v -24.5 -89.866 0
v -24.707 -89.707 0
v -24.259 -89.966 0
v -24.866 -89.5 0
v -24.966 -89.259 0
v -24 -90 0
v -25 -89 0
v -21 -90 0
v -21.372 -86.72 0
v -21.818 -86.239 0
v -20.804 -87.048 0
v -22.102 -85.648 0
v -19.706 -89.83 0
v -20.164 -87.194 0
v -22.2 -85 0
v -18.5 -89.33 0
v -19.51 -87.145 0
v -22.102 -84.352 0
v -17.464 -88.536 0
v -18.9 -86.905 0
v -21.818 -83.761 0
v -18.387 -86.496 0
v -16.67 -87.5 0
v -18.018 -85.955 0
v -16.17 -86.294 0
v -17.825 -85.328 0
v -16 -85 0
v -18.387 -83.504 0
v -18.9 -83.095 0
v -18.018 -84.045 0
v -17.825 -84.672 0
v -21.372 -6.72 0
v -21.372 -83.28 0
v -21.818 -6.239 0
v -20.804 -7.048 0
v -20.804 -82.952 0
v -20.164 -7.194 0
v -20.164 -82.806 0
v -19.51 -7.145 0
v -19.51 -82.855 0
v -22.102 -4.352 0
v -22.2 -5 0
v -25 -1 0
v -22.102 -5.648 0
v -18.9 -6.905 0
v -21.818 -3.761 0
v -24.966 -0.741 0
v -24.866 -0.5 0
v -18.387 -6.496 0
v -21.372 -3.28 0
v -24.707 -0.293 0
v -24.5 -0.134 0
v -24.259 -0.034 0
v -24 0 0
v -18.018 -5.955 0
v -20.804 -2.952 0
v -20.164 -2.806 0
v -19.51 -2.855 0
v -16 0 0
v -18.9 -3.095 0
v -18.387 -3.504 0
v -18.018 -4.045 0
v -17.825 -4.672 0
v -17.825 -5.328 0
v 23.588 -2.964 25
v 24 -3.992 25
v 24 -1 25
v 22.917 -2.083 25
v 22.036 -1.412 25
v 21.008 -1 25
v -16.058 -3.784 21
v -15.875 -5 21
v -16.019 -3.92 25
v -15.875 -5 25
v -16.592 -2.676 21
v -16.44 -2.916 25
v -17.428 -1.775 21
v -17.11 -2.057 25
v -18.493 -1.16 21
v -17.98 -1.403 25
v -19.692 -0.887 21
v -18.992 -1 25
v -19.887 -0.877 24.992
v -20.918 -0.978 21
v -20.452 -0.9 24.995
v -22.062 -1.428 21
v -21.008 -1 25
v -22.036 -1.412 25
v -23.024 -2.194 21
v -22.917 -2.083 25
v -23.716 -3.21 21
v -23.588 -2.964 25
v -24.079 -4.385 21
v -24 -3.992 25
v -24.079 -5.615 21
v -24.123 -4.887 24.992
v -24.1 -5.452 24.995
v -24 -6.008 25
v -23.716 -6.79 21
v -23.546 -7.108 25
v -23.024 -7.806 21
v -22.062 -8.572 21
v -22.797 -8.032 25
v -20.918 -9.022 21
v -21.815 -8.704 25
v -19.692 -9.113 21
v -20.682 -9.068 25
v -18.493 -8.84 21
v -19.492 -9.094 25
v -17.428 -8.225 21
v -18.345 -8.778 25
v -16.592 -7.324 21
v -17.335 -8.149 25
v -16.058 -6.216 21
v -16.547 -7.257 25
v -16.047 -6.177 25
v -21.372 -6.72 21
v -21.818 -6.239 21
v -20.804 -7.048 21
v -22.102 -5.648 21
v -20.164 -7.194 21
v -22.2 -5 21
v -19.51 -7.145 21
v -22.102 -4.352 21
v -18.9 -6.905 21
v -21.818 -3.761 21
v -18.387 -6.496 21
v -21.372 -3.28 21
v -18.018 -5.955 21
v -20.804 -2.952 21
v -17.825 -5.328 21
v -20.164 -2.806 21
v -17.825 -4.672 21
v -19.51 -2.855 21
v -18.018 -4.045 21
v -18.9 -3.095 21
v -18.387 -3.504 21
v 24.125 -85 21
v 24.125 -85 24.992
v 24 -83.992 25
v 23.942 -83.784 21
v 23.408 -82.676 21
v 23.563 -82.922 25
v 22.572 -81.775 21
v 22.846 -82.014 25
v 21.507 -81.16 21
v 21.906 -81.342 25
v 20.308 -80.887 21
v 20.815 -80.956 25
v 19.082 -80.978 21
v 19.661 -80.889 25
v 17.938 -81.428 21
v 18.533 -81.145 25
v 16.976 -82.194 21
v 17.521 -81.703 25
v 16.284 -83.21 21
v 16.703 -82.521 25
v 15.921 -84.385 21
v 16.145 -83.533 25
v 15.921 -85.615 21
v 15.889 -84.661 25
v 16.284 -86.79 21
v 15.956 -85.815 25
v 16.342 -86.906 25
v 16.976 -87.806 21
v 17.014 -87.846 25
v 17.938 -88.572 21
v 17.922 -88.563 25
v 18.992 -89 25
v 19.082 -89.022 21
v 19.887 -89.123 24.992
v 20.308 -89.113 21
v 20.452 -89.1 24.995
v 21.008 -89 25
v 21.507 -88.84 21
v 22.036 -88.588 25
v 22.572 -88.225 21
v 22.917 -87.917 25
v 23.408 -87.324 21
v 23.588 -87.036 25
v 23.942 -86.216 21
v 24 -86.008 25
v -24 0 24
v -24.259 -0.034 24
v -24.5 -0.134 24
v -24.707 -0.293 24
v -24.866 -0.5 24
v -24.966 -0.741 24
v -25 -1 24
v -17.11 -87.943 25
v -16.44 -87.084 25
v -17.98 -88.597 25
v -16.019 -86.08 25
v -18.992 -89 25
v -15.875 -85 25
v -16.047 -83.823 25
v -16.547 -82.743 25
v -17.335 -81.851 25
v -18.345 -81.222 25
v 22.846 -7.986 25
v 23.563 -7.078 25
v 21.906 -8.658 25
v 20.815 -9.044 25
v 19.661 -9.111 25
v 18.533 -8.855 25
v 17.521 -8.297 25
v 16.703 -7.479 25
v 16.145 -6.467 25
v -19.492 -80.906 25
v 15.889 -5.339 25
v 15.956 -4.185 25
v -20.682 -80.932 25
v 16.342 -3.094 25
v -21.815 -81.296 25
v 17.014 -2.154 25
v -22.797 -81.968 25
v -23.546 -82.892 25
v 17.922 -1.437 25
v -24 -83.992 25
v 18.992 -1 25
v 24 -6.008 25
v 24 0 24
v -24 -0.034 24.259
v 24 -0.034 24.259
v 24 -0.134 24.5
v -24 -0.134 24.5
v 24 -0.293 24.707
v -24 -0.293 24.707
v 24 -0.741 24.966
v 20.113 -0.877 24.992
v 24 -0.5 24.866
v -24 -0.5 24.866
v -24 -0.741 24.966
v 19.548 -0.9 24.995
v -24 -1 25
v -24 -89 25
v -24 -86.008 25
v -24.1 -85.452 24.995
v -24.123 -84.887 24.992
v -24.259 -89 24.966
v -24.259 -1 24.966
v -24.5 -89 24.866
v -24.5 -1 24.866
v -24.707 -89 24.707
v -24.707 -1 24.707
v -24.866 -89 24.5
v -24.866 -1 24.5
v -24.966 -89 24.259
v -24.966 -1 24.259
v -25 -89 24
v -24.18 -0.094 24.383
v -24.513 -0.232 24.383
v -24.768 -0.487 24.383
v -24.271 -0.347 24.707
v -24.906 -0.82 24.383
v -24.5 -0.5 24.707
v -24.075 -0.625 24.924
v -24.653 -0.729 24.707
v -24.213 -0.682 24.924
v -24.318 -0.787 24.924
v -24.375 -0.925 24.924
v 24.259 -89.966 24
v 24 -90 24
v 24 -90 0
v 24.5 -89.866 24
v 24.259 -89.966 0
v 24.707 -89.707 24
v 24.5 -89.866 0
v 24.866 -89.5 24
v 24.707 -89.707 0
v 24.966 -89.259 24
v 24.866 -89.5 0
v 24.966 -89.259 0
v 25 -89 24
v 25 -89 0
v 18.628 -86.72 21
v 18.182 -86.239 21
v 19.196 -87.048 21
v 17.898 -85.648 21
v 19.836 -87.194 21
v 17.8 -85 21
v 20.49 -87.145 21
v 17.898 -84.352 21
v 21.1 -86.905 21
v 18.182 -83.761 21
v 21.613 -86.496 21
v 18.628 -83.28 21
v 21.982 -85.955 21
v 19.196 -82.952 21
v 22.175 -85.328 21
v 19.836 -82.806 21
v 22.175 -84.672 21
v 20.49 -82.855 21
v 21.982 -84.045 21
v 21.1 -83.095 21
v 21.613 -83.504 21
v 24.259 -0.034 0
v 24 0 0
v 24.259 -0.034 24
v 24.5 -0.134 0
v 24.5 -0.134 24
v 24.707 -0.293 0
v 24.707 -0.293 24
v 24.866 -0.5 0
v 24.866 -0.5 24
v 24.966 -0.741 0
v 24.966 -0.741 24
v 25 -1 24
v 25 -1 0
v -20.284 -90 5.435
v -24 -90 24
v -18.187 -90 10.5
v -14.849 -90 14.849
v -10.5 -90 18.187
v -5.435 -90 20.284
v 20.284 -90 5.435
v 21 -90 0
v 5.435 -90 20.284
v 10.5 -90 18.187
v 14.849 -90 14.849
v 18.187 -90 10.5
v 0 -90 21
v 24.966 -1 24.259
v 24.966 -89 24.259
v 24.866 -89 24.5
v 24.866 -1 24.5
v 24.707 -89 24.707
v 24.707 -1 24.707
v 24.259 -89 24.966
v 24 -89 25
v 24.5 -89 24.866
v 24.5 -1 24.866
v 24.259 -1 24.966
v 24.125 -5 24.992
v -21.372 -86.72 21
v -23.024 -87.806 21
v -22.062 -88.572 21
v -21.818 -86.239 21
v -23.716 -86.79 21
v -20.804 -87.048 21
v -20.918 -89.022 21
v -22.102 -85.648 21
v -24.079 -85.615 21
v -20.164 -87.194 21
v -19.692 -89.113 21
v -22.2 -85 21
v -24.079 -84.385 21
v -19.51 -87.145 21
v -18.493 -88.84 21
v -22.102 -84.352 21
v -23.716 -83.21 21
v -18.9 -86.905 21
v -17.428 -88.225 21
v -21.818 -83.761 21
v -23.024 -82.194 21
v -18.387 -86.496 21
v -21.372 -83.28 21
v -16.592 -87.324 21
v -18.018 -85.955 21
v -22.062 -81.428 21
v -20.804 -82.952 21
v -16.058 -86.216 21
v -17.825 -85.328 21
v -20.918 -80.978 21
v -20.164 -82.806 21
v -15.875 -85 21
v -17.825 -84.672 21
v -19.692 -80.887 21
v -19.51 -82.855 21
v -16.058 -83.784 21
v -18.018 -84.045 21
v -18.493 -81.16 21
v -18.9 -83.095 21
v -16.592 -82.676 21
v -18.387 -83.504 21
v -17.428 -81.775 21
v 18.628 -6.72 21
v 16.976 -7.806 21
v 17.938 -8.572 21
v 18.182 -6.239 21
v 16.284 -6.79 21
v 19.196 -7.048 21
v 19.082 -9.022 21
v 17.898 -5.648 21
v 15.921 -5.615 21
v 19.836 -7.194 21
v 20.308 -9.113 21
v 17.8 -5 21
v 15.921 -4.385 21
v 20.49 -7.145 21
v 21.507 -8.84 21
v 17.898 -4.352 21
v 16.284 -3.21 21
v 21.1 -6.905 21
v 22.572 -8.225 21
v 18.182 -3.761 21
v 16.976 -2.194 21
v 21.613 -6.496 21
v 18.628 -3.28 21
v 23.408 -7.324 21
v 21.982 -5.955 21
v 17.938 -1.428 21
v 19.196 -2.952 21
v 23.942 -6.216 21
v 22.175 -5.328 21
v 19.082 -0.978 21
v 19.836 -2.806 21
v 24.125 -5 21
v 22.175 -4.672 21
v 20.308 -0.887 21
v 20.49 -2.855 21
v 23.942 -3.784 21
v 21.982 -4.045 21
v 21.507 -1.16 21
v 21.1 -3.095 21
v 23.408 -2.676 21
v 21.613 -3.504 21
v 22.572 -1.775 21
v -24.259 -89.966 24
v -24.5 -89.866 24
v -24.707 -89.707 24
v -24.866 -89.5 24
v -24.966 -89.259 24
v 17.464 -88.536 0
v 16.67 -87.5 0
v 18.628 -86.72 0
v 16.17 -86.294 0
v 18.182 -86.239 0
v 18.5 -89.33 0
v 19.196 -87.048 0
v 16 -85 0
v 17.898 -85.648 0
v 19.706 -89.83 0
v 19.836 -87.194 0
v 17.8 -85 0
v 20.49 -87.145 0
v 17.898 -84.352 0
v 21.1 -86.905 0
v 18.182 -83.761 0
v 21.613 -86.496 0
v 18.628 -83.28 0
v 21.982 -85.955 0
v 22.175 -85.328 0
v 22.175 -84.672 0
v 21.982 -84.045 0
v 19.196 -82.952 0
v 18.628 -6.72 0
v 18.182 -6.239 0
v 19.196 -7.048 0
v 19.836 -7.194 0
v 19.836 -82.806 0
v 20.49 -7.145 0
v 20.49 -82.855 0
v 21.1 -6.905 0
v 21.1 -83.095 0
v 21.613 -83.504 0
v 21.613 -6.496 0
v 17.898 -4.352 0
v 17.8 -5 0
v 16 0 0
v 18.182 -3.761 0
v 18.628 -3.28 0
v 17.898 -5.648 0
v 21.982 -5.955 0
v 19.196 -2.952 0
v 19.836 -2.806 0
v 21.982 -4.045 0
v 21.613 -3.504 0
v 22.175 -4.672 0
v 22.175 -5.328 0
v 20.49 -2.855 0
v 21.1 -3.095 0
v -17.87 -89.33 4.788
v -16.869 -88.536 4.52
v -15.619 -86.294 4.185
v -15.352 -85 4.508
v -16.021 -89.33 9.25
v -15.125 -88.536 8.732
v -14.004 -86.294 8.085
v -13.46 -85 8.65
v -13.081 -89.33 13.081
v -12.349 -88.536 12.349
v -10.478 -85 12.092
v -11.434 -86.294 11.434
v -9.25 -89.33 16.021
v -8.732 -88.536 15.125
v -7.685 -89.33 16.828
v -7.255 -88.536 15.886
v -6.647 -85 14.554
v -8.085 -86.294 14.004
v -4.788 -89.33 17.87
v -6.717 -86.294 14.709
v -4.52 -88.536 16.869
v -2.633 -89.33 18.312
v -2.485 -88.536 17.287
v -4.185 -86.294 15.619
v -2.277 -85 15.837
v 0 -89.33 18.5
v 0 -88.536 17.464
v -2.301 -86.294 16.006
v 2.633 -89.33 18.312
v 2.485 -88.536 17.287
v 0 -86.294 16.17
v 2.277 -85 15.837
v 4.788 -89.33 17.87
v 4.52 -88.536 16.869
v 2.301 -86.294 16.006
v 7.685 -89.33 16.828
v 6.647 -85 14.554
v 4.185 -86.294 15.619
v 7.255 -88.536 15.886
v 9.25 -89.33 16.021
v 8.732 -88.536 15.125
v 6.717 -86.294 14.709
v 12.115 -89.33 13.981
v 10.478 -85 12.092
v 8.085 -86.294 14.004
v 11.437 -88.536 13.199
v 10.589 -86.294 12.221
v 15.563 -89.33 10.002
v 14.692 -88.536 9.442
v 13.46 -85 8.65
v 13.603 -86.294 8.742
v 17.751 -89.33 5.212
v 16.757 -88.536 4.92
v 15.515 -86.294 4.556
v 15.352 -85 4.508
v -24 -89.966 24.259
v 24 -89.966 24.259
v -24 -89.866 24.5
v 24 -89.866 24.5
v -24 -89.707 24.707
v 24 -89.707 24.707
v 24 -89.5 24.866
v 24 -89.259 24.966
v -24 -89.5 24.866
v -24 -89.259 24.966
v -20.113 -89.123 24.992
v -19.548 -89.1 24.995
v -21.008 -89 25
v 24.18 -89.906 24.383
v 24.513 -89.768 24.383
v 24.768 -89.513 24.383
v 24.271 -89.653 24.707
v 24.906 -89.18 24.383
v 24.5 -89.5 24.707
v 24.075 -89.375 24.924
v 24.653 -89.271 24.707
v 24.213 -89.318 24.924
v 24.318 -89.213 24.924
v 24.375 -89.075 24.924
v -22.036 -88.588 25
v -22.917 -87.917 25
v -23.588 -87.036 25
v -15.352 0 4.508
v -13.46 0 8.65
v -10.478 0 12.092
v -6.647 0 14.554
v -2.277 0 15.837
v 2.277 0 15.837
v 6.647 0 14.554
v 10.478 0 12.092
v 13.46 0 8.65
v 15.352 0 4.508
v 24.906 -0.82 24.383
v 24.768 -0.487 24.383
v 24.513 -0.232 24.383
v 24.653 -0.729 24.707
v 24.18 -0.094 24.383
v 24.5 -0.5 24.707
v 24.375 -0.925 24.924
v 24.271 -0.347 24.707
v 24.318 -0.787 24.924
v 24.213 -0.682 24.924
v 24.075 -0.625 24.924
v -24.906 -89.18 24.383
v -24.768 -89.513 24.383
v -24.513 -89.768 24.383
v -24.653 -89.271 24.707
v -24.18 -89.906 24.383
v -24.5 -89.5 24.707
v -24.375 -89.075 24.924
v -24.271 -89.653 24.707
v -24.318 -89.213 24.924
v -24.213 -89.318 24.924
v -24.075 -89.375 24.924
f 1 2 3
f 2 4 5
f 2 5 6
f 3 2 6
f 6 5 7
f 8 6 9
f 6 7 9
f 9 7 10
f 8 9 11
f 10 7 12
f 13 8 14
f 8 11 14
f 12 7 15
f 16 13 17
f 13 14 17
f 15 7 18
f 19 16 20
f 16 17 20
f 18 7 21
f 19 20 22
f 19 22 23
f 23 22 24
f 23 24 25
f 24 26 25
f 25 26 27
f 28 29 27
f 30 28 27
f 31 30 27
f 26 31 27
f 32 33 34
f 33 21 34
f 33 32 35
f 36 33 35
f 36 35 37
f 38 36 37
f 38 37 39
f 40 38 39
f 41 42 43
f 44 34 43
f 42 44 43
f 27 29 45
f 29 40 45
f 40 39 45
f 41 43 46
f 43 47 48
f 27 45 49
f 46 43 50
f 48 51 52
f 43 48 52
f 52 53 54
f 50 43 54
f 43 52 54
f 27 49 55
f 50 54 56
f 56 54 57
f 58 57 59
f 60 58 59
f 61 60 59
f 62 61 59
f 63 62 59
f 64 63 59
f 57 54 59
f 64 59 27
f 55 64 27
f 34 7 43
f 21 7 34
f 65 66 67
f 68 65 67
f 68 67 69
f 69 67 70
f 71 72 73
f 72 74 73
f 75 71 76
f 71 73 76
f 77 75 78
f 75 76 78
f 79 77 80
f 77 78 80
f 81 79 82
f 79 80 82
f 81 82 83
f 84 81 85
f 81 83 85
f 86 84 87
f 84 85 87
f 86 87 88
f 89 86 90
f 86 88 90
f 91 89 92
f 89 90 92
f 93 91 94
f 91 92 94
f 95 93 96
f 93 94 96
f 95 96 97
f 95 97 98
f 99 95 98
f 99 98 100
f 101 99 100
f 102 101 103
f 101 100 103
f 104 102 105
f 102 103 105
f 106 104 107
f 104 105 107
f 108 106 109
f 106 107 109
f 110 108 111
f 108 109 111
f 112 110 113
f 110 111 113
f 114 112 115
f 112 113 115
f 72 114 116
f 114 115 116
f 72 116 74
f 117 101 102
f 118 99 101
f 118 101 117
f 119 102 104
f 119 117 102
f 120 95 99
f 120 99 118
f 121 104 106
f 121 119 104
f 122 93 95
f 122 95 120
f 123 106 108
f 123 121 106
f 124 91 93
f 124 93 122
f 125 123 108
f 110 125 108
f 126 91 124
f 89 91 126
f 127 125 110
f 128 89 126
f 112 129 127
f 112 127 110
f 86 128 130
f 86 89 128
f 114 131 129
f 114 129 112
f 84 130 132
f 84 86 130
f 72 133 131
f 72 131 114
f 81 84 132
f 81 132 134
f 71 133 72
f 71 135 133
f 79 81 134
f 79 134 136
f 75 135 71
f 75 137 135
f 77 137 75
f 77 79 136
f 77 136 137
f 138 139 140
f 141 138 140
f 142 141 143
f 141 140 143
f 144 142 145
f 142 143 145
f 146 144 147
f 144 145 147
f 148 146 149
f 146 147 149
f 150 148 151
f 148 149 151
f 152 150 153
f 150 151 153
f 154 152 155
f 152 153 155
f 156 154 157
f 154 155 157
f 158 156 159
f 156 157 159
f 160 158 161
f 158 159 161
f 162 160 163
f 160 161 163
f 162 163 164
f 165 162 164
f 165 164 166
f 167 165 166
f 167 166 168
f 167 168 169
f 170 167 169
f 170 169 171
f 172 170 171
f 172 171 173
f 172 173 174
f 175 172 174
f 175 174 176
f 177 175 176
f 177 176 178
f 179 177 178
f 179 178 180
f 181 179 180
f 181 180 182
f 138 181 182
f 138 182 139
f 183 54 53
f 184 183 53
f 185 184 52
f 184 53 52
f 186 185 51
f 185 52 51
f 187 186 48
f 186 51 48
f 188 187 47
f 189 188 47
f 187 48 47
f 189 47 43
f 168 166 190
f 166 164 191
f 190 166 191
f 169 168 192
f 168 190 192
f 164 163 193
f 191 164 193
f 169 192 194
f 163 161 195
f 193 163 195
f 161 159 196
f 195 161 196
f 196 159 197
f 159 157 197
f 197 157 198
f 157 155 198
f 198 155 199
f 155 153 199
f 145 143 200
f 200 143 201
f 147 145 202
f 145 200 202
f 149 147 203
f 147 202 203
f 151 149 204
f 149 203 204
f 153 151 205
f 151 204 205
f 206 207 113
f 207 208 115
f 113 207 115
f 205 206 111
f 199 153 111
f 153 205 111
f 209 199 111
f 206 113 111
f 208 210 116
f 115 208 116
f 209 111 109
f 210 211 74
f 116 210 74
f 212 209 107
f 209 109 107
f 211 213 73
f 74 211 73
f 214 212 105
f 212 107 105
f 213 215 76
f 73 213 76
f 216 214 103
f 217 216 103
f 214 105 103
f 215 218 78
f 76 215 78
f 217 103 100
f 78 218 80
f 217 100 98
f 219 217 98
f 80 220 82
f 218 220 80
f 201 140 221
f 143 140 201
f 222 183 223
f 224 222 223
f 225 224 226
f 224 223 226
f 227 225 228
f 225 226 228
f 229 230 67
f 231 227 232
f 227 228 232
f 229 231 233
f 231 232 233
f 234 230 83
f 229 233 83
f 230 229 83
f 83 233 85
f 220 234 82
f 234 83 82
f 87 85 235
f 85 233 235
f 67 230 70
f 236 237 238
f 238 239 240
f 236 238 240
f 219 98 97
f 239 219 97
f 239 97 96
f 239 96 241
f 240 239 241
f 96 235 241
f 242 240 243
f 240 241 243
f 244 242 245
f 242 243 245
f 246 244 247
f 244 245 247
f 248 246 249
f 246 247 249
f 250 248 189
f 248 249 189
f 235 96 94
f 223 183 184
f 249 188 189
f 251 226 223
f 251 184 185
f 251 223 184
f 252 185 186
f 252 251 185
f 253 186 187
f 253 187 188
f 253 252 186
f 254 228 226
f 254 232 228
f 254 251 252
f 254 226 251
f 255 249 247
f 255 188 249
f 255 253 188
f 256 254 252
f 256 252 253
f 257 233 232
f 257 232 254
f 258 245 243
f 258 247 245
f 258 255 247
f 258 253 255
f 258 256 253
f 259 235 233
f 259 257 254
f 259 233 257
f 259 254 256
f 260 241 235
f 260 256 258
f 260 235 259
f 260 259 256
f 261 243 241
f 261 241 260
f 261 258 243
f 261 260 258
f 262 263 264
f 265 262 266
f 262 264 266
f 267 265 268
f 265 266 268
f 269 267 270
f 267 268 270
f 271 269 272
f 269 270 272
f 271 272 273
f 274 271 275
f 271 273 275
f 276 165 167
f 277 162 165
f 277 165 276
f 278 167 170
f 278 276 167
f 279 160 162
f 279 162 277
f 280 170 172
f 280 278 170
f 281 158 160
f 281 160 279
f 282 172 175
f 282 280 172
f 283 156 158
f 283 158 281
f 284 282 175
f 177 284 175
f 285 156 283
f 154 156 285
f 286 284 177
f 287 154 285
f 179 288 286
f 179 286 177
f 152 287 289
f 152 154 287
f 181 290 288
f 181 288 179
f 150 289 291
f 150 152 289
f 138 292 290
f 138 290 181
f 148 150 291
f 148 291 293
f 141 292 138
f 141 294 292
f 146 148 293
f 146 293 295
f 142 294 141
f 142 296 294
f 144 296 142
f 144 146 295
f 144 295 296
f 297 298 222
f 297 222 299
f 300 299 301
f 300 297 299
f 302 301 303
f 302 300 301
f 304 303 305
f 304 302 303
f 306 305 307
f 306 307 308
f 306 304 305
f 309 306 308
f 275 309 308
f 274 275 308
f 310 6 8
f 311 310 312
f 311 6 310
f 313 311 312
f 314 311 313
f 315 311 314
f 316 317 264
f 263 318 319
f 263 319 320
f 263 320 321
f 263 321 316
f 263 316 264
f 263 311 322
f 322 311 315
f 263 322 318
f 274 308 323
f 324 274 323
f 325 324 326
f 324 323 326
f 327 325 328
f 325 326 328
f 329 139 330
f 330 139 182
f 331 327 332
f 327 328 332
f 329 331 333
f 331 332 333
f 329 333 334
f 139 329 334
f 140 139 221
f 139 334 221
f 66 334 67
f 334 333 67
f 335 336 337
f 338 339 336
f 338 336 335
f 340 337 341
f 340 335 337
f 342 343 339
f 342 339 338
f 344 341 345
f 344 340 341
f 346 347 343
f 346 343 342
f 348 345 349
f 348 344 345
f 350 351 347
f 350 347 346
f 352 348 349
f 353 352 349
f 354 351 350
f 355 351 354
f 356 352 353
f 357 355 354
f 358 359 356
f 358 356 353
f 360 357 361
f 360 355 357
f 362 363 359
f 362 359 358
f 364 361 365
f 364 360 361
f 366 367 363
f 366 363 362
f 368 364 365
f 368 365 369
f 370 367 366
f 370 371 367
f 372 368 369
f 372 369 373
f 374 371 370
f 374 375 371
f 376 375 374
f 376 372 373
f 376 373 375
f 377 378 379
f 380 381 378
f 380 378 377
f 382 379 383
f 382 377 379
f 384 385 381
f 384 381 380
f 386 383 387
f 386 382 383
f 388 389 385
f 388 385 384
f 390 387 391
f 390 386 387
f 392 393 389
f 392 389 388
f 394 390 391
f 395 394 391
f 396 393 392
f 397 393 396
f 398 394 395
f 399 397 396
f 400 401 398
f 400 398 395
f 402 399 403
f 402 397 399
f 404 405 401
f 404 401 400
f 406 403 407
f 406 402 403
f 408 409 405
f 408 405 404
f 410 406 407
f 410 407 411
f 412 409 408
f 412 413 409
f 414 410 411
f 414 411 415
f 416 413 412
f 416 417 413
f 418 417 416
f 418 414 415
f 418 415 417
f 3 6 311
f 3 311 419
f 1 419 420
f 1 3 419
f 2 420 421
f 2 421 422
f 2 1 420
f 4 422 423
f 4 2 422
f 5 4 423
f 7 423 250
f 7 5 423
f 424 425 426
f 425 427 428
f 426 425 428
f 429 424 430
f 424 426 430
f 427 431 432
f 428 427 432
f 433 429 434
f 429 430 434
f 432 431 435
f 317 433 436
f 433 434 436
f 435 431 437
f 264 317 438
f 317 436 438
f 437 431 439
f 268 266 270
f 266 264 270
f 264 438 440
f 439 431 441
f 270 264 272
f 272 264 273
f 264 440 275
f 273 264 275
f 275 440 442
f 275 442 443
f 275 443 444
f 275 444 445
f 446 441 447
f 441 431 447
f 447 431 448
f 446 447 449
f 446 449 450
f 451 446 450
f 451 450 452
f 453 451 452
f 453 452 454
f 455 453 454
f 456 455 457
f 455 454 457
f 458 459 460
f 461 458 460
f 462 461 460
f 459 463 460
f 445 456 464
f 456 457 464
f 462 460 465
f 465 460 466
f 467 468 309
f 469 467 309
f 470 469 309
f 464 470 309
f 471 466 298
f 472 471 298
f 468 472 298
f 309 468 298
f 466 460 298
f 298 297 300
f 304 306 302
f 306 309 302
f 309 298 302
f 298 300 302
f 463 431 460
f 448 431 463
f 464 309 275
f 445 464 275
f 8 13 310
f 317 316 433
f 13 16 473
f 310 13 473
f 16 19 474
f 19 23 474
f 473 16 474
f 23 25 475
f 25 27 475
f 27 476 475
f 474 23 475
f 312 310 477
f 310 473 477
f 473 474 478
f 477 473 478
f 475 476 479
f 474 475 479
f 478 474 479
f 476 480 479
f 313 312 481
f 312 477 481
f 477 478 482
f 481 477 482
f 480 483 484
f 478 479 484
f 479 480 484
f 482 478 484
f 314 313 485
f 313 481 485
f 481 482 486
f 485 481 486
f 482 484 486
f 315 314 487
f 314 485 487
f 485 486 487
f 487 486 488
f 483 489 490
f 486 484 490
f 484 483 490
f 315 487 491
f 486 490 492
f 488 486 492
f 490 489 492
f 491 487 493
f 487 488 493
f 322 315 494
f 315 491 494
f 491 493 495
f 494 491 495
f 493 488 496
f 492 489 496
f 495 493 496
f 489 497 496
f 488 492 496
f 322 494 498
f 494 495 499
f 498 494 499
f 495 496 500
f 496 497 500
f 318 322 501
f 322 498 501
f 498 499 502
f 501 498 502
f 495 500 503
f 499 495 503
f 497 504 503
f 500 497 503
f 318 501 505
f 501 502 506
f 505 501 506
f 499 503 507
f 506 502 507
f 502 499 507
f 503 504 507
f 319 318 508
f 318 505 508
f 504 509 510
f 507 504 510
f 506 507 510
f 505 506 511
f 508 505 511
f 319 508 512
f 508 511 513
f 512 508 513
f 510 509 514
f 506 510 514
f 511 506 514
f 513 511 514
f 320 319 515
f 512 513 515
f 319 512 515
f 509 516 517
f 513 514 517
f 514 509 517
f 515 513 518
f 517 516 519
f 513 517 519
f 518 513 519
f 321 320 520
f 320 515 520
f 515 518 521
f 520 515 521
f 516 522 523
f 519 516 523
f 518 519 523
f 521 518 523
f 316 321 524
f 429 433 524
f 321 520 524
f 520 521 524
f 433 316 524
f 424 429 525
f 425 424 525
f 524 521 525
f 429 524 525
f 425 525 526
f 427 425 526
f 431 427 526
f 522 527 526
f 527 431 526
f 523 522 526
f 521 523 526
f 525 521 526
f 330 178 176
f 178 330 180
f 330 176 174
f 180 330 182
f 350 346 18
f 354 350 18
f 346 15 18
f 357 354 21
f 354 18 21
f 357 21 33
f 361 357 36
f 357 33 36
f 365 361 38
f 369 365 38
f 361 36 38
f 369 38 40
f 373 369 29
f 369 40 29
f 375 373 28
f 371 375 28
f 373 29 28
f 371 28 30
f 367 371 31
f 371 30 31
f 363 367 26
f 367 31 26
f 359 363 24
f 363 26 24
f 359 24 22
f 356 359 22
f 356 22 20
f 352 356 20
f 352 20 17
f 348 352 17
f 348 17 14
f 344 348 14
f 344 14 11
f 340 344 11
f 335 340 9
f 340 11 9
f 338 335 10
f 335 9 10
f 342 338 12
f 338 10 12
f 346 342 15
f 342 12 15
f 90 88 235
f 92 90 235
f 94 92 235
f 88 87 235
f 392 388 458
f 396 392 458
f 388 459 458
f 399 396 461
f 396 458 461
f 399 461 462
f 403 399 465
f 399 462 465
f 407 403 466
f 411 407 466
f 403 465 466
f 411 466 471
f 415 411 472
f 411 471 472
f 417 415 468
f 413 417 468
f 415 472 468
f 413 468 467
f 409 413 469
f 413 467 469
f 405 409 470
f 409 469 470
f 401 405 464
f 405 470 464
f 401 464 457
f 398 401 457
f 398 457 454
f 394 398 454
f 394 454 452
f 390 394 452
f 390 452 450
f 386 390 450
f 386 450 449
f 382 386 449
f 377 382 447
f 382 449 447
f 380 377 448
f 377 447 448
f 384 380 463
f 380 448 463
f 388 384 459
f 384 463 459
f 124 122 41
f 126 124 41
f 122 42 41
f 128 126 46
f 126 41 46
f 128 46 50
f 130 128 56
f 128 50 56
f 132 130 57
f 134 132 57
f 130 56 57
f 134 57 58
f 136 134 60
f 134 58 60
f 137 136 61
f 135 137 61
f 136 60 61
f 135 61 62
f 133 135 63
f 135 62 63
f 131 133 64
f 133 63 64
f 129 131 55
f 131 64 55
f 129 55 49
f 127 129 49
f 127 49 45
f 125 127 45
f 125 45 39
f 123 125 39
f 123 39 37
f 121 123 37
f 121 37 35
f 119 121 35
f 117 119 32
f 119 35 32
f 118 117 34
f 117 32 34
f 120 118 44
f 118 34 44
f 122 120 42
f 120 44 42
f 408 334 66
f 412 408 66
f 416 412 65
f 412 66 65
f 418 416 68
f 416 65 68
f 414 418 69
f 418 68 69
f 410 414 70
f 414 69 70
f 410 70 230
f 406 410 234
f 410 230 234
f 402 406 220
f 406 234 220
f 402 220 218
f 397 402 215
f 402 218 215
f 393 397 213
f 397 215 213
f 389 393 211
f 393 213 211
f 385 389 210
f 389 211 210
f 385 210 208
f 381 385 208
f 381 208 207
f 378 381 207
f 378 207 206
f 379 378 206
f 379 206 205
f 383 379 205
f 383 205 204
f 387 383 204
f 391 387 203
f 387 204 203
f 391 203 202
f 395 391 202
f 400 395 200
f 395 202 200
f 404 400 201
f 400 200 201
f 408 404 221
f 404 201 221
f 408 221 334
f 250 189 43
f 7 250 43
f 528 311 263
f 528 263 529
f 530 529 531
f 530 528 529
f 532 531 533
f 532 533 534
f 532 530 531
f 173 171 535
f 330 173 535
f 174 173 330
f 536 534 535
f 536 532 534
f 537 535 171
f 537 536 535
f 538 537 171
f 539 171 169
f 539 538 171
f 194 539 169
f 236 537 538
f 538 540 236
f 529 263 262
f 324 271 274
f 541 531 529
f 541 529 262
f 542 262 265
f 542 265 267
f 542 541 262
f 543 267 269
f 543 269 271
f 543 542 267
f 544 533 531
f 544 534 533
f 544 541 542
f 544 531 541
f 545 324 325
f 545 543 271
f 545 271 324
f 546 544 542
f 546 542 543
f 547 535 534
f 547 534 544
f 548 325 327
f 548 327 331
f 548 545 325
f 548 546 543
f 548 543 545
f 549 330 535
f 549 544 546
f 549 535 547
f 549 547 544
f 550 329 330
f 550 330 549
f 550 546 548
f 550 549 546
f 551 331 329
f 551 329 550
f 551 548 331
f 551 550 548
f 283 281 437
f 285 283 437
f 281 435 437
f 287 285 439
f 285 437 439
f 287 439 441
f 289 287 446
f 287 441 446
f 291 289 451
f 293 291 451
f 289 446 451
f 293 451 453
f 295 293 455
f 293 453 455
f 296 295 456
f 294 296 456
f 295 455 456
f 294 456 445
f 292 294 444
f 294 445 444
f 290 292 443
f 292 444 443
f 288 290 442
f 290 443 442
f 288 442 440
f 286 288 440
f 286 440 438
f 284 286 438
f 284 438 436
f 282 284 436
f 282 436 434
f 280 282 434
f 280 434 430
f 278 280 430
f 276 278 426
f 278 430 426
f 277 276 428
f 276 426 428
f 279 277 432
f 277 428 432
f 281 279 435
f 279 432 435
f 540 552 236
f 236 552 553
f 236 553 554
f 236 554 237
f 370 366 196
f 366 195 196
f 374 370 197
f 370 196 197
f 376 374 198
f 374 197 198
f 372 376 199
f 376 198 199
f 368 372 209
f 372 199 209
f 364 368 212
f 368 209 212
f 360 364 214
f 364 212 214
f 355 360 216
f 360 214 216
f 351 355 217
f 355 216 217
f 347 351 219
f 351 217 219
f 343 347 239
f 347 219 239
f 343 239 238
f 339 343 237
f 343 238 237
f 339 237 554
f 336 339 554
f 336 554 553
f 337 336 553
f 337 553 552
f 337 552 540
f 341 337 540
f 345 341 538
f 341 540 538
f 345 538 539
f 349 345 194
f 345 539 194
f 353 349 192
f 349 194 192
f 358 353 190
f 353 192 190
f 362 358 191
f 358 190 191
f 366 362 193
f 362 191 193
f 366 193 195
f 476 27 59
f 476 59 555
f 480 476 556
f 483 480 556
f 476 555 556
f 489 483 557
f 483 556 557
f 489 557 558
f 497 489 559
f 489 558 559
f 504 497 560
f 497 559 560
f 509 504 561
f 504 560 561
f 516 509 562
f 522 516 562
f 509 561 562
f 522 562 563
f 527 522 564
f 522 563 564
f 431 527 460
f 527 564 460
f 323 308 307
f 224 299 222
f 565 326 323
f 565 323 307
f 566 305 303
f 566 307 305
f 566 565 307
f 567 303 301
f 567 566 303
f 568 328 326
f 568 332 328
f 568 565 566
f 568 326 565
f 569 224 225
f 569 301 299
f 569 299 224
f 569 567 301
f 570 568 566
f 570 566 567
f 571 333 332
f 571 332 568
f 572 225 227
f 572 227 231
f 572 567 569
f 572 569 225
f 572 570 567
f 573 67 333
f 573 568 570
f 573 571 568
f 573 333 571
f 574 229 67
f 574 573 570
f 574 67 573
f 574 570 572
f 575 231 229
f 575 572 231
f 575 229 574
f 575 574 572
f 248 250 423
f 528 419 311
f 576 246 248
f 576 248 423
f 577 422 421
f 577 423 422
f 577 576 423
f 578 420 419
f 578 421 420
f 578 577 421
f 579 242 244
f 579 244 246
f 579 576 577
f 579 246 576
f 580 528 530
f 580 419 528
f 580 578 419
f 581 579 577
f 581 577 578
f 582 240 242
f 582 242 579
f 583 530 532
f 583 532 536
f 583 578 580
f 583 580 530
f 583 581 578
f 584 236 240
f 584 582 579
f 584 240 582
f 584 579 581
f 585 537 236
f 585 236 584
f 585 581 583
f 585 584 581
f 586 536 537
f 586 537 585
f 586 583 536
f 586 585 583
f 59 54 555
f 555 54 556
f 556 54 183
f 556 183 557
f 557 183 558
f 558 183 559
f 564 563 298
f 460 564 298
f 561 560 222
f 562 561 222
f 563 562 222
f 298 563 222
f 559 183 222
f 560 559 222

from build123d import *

# Parameters (mm, degrees)
F1_DEPTH       = 90
F3_D           = 4.4
F3_CBORE_D     = 8.25
F3_CBORE_DEPTH = 4
F4_R           = 5
F5_T1_DEPTH    = 88
F5_T3_DEPTH    = 26.5
F5_T5_DEPTH    = 48
F5_S9_W        = 1
F5_S9_H        = 1
F5_T10_DEPTH   = 1
F5_S15_W       = 1
F5_S15_H       = 1
F5_T16_DEPTH   = 1
F5_S21_W       = 1
F5_S21_H       = 1
F5_T22_DEPTH   = 1
F5_S27_W       = 1
F5_S27_H       = 1
F5_T28_DEPTH   = 1


# Not quite as in the source:
# - a fillet or chamfer that OpenCascade refuses, or shapes differently, is made with other operations: its cross-section is extruded or revolved along the edge and cut away or added


with BuildPart() as f1:
    # F0 (on Front) → F1 (new body)
    with BuildSketch(Plane.XZ):
        with BuildLine():
            Line((25, 0), (25, 25))
            Line((25, 25), (-25, 25))
            Line((-25, 25), (-25, 0))
            Line((-25, 0), (-16, 0))
            ThreePointArc((-16, 0), (0, 16), (16, 0))
            Line((16, 0), (25, 0))
        make_face()
    extrude(amount=F1_DEPTH)

    # F3 (through all)
    with Locations(Plane.XY.offset(25)):
        with Locations((-20, -85), (-20, -5), (20, -5), (20, -85)):
            CounterBoreHole(F3_D / 2, F3_CBORE_D / 2, F3_CBORE_DEPTH)

    # F4
    f4_edges = [f1.edges().sort_by_distance(p)[0] for p in [
        (0, -90, 16),
    ]]
    fillet(f4_edges, radius=F4_R)

    # F5: fillet of radius 1 on 8 edges, made by hand

    # F5_s2 → F5_t1 (cut)
    with BuildSketch(Plane.XZ.offset(1)):
        with BuildLine():
            ThreePointArc((25, 24), (24.7071067812, 24.7071067812), (24, 25))
            Line((24, 25), (25, 25))
            Line((25, 25), (25, 24))
        make_face()
        with BuildLine():
            ThreePointArc((-24, 25), (-24.7071067812, 24.7071067812), (-25, 24))
            Line((-25, 24), (-25, 25))
            Line((-25, 25), (-24, 25))
        make_face()
    extrude(amount=F5_T1_DEPTH, mode=Mode.SUBTRACT)

    # F5_s4 → F5_t3 (cut)
    with BuildSketch(Plane.XY.offset(-2.5)):
        with BuildLine():
            ThreePointArc((24, -90), (24.7071067812, -89.7071067812), (25, -89))
            Line((25, -89), (25, -90))
            Line((25, -90), (24, -90))
        make_face()
        with BuildLine():
            ThreePointArc((24, 0), (24.7071067812, -0.2928932188), (25, -1))
            Line((25, -1), (25, 0))
            Line((25, 0), (24, 0))
        make_face()
        with BuildLine():
            ThreePointArc((-24, 0), (-24.7071067812, -0.2928932188), (-25, -1))
            Line((-25, -1), (-25, 0))
            Line((-25, 0), (-24, 0))
        make_face()
        with BuildLine():
            ThreePointArc((-24, -90), (-24.7071067812, -89.7071067812), (-25, -89))
            Line((-25, -89), (-25, -90))
            Line((-25, -90), (-24, -90))
        make_face()
    extrude(amount=F5_T3_DEPTH, mode=Mode.SUBTRACT)

    # F5_s6 → F5_t5 (cut)
    with BuildSketch(Plane.YZ.offset(-24)):
        with BuildLine():
            ThreePointArc((0, 24), (-0.2928932188, 24.7071067812), (-1, 25))
            Line((-1, 25), (0, 25))
            Line((0, 25), (0, 24))
        make_face()
        with BuildLine():
            ThreePointArc((-90, 24), (-89.7071067812, 24.7071067812), (-89, 25))
            Line((-89, 25), (-90, 25))
            Line((-90, 25), (-90, 24))
        make_face()
    extrude(amount=F5_T5_DEPTH, mode=Mode.SUBTRACT)


with BuildPart() as f5_tool8:
    # F5_s9 → F5_t10 (new body)
    with BuildSketch(Plane.XY.offset(24)):
        with Locations((24.5, -0.5)):
            Rectangle(F5_S9_W, F5_S9_H)
    extrude(amount=F5_T10_DEPTH)

    # F5_s11 → F5_t12 (revolve, cut)
    with BuildSketch(Plane(origin=(24, -1, 24), x_dir=(-0.7071067812, -0.7071067812, 0), z_dir=(-0.7071067812, 0.7071067812, 0))):
        with BuildLine():
            ThreePointArc((0, -1), (1, 0), (0, 1))
            Line((0, 1), (0, -1))
        make_face()
    revolve(axis=Axis((24, -1, 24), (0, 0, 1)), mode=Mode.SUBTRACT)


with BuildPart() as f1_1:
    add(f1.part)

    # F5_t7: cut F5_tool8
    add(f5_tool8.part, mode=Mode.SUBTRACT)


with BuildPart() as f5_tool14:
    # F5_s15 → F5_t16 (new body)
    with BuildSketch(Plane.XY.offset(24)):
        with Locations((24.5, -89.5)):
            Rectangle(F5_S15_W, F5_S15_H)
    extrude(amount=F5_T16_DEPTH)

    # F5_s17 → F5_t18 (revolve, cut)
    with BuildSketch(Plane(origin=(24, -89, 24), x_dir=(-0.7071067812, 0.7071067812, 0), z_dir=(0.7071067812, 0.7071067812, 0))):
        with BuildLine():
            ThreePointArc((0, -1), (1, 0), (0, 1))
            Line((0, 1), (0, -1))
        make_face()
    revolve(axis=Axis((24, -89, 24), (0, 0, 1)), mode=Mode.SUBTRACT)


with BuildPart() as f1_2:
    add(f1_1.part)

    # F5_t13: cut F5_tool14
    add(f5_tool14.part, mode=Mode.SUBTRACT)


with BuildPart() as f5_tool20:
    # F5_s21 → F5_t22 (new body)
    with BuildSketch(Plane.XY.offset(24)):
        with Locations((-24.5, -0.5)):
            Rectangle(F5_S21_W, F5_S21_H)
    extrude(amount=F5_T22_DEPTH)

    # F5_s23 → F5_t24 (revolve, cut)
    with BuildSketch(Plane(origin=(-24, -1, 24), x_dir=(0.7071067812, -0.7071067812, 0), z_dir=(-0.7071067812, -0.7071067812, 0))):
        with BuildLine():
            ThreePointArc((0, -1), (1, 0), (0, 1))
            Line((0, 1), (0, -1))
        make_face()
    revolve(axis=Axis((-24, -1, 24), (0, 0, 1)), mode=Mode.SUBTRACT)


with BuildPart() as f1_3:
    add(f1_2.part)

    # F5_t19: cut F5_tool20
    add(f5_tool20.part, mode=Mode.SUBTRACT)


with BuildPart() as f5_tool26:
    # F5_s27 → F5_t28 (new body)
    with BuildSketch(Plane.XY.offset(24)):
        with Locations((-24.5, -89.5)):
            Rectangle(F5_S27_W, F5_S27_H)
    extrude(amount=F5_T28_DEPTH)

    # F5_s29 → F5_t30 (revolve, cut)
    with BuildSketch(Plane(origin=(-24, -89, 24), x_dir=(0.7071067812, 0.7071067812, 0), z_dir=(0.7071067812, -0.7071067812, 0))):
        with BuildLine():
            ThreePointArc((0, -1), (1, 0), (0, 1))
            Line((0, 1), (0, -1))
        make_face()
    revolve(axis=Axis((-24, -89, 24), (0, 0, 1)), mode=Mode.SUBTRACT)


with BuildPart() as f1_4:
    add(f1_3.part)

    # F5_t25: cut F5_tool26
    add(f5_tool26.part, mode=Mode.SUBTRACT)


solid = f1_4.part
